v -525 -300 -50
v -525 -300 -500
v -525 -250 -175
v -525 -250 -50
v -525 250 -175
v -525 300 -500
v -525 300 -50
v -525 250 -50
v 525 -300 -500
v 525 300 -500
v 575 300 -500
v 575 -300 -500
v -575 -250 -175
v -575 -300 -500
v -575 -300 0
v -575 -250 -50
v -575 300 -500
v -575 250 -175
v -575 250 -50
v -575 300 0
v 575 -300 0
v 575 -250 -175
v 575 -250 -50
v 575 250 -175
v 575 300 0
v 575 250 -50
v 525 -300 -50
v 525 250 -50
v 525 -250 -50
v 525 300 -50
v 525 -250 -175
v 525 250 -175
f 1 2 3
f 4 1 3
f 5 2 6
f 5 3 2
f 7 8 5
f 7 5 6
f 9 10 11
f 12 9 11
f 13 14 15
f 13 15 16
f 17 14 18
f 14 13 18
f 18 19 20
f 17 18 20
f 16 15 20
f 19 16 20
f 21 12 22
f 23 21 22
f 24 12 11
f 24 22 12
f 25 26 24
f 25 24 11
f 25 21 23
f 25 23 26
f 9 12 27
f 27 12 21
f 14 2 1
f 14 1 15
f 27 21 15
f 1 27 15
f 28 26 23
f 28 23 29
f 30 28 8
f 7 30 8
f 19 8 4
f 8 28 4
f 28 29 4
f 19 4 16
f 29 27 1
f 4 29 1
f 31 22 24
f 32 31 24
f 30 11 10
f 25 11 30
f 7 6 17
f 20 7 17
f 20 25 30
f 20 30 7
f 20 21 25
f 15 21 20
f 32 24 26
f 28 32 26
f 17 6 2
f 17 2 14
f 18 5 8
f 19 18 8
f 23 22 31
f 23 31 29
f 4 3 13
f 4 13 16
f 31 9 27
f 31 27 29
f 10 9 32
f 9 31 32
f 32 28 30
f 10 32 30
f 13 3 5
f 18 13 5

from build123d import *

# Parameters (mm, degrees)
F0_W     = 575
F0_H     = 300
F1_DEPTH = 50
F2_W     = 50
F2_H     = 300
F3_DEPTH = 450
F5_DEPTH = 50
F8_W     = 500
F8_H     = 125
F9_DEPTH = 1150.001


# Not quite as in the source:
# - a feature of the source that left no trace in its solid (it failed there, or was rolled back) is left out


with BuildPart() as f1:
    # F0 (on Top) → F1 (new body)
    with BuildSketch(Plane.XY):
        with Locations((287.5, -150)):
            Rectangle(F0_W, F0_H)
    extrude(amount=-F1_DEPTH)

    # F2 (on face) → F3 (join)
    with BuildSketch(Plane(origin=(0, 0, -50), x_dir=(1, 0, 0), z_dir=(0, 0, -1))):
        with Locations((550, 150)):
            Rectangle(F2_W, F2_H)
    extrude(amount=F3_DEPTH)

    # F4 (on face) → F5 (join, through all)
    with BuildSketch(Plane.YZ.offset(575)):
        Polygon((50, -30), (0, -80), (0, -150.7106781187), (120.7106781187, -30), align=None)
    extrude(amount=-F5_DEPTH)

    # F6: F1 across plane


with BuildPart() as f1_1:
    add(f1.part)
    add(f1.part.mirror(Plane.YZ))

    # F7: F1 across plane


with BuildPart() as f1_2:
    add(f1_1.part)
    add(f1_1.part.mirror(Plane.XZ))

    # F8 (on face) → F9 (cut, through all)
    with BuildSketch(Plane.YZ.offset(575)):
        with Locations((0, -112.5)):
            Rectangle(F8_W, F8_H)
    extrude(amount=-F9_DEPTH, mode=Mode.SUBTRACT)


solid = f1_2.part
